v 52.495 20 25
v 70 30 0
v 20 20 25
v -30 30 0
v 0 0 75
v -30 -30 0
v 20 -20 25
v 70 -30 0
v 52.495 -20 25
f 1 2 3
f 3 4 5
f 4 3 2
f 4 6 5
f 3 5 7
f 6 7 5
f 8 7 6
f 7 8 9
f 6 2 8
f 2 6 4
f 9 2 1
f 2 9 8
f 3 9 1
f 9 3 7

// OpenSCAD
// (c) Luana Neder CC-BY-SA-4.0
// https://luana.dev.br/2025/09/20/KrissiaShape.html
d = 100/4; // Total length will be 4d, and I want it to be 10cm
side = (12/5) * d; // Side of  the pyramid (thanks, Miguel!)
rsq = (side * sqrt(2))/2; // diagonal of the square, halfed ("radius" of the "cylinder")


rotate([0, 0, 45]) {
    cylinder( 3*d, // height
        rsq, // bottom "radius" (l * srqt(2) / 2)
        00, // top "radius" (l * srqt(2) / 2)
        $fn=4 // 4 faces resolution (square base)
    );
};


x = (8/5) * d; // For the vertices of the trapezoid (thanks, Rádio!)
y = (2/5) * d; // Same as x
endcoord = (4*d) - (side/2); // Total length is 4d, but pyramid is centered on axis
iatr = 55; // Inclination θ of right side of the trapezoid, chosen arbitrarily as 55 deg bc it looks good
topendcoord = endcoord - (d * tan(90-iatr)); 
//topendcoord = endcoord - y; // option: I think this might make it parallel to the pyramid's side

// Point test
//translate([side/2, -side/2, 0]) sphere(r = 1);
//translate([side/2, side/2, 0]) sphere(r = 1);
//translate([x/2, x/2, d]) sphere(r = 1);
//translate([x/2, -x/2, d]) sphere(r = 1);
//translate([endcoord, side/2, 0]) sphere(r = 1);
//translate([endcoord, -side/2, 0]) sphere(r = 1);
//#translate([topendcoord, -((side/2) - y), d]) sphere(r = 1);
//#translate([topendcoord, ((side/2) - y), d]) sphere(r = 1);

polyhedron(
    // Vertices
    points=[
        [side/2, -side/2, 0], // 0
        [side/2, side/2, 0], // 1
        [x/2, x/2, d], // 2
        [x/2, -x/2, d], // 3
        [endcoord, side/2, 0], // 4 
        [endcoord, -side/2, 0], // 5
        [topendcoord, -((side/2) - y), d], // 6
        [topendcoord, ((side/2) - y), d] // 7
    ],

    
    faces=[ // faces in any ordeer, points in faces order by left hand rule (thumb: direction of n)
        [0,1,2,3], // Pyramid Face (left)
        [0,5,4,1], // Bottom
        [5,6,7,4], // Inclined right (B)
        [3,2,7,6], // Top (C)
        [0,3,6,5], // Front (->x ^z (X)y)
        [7,2,1,4] // Back
    ]
);
